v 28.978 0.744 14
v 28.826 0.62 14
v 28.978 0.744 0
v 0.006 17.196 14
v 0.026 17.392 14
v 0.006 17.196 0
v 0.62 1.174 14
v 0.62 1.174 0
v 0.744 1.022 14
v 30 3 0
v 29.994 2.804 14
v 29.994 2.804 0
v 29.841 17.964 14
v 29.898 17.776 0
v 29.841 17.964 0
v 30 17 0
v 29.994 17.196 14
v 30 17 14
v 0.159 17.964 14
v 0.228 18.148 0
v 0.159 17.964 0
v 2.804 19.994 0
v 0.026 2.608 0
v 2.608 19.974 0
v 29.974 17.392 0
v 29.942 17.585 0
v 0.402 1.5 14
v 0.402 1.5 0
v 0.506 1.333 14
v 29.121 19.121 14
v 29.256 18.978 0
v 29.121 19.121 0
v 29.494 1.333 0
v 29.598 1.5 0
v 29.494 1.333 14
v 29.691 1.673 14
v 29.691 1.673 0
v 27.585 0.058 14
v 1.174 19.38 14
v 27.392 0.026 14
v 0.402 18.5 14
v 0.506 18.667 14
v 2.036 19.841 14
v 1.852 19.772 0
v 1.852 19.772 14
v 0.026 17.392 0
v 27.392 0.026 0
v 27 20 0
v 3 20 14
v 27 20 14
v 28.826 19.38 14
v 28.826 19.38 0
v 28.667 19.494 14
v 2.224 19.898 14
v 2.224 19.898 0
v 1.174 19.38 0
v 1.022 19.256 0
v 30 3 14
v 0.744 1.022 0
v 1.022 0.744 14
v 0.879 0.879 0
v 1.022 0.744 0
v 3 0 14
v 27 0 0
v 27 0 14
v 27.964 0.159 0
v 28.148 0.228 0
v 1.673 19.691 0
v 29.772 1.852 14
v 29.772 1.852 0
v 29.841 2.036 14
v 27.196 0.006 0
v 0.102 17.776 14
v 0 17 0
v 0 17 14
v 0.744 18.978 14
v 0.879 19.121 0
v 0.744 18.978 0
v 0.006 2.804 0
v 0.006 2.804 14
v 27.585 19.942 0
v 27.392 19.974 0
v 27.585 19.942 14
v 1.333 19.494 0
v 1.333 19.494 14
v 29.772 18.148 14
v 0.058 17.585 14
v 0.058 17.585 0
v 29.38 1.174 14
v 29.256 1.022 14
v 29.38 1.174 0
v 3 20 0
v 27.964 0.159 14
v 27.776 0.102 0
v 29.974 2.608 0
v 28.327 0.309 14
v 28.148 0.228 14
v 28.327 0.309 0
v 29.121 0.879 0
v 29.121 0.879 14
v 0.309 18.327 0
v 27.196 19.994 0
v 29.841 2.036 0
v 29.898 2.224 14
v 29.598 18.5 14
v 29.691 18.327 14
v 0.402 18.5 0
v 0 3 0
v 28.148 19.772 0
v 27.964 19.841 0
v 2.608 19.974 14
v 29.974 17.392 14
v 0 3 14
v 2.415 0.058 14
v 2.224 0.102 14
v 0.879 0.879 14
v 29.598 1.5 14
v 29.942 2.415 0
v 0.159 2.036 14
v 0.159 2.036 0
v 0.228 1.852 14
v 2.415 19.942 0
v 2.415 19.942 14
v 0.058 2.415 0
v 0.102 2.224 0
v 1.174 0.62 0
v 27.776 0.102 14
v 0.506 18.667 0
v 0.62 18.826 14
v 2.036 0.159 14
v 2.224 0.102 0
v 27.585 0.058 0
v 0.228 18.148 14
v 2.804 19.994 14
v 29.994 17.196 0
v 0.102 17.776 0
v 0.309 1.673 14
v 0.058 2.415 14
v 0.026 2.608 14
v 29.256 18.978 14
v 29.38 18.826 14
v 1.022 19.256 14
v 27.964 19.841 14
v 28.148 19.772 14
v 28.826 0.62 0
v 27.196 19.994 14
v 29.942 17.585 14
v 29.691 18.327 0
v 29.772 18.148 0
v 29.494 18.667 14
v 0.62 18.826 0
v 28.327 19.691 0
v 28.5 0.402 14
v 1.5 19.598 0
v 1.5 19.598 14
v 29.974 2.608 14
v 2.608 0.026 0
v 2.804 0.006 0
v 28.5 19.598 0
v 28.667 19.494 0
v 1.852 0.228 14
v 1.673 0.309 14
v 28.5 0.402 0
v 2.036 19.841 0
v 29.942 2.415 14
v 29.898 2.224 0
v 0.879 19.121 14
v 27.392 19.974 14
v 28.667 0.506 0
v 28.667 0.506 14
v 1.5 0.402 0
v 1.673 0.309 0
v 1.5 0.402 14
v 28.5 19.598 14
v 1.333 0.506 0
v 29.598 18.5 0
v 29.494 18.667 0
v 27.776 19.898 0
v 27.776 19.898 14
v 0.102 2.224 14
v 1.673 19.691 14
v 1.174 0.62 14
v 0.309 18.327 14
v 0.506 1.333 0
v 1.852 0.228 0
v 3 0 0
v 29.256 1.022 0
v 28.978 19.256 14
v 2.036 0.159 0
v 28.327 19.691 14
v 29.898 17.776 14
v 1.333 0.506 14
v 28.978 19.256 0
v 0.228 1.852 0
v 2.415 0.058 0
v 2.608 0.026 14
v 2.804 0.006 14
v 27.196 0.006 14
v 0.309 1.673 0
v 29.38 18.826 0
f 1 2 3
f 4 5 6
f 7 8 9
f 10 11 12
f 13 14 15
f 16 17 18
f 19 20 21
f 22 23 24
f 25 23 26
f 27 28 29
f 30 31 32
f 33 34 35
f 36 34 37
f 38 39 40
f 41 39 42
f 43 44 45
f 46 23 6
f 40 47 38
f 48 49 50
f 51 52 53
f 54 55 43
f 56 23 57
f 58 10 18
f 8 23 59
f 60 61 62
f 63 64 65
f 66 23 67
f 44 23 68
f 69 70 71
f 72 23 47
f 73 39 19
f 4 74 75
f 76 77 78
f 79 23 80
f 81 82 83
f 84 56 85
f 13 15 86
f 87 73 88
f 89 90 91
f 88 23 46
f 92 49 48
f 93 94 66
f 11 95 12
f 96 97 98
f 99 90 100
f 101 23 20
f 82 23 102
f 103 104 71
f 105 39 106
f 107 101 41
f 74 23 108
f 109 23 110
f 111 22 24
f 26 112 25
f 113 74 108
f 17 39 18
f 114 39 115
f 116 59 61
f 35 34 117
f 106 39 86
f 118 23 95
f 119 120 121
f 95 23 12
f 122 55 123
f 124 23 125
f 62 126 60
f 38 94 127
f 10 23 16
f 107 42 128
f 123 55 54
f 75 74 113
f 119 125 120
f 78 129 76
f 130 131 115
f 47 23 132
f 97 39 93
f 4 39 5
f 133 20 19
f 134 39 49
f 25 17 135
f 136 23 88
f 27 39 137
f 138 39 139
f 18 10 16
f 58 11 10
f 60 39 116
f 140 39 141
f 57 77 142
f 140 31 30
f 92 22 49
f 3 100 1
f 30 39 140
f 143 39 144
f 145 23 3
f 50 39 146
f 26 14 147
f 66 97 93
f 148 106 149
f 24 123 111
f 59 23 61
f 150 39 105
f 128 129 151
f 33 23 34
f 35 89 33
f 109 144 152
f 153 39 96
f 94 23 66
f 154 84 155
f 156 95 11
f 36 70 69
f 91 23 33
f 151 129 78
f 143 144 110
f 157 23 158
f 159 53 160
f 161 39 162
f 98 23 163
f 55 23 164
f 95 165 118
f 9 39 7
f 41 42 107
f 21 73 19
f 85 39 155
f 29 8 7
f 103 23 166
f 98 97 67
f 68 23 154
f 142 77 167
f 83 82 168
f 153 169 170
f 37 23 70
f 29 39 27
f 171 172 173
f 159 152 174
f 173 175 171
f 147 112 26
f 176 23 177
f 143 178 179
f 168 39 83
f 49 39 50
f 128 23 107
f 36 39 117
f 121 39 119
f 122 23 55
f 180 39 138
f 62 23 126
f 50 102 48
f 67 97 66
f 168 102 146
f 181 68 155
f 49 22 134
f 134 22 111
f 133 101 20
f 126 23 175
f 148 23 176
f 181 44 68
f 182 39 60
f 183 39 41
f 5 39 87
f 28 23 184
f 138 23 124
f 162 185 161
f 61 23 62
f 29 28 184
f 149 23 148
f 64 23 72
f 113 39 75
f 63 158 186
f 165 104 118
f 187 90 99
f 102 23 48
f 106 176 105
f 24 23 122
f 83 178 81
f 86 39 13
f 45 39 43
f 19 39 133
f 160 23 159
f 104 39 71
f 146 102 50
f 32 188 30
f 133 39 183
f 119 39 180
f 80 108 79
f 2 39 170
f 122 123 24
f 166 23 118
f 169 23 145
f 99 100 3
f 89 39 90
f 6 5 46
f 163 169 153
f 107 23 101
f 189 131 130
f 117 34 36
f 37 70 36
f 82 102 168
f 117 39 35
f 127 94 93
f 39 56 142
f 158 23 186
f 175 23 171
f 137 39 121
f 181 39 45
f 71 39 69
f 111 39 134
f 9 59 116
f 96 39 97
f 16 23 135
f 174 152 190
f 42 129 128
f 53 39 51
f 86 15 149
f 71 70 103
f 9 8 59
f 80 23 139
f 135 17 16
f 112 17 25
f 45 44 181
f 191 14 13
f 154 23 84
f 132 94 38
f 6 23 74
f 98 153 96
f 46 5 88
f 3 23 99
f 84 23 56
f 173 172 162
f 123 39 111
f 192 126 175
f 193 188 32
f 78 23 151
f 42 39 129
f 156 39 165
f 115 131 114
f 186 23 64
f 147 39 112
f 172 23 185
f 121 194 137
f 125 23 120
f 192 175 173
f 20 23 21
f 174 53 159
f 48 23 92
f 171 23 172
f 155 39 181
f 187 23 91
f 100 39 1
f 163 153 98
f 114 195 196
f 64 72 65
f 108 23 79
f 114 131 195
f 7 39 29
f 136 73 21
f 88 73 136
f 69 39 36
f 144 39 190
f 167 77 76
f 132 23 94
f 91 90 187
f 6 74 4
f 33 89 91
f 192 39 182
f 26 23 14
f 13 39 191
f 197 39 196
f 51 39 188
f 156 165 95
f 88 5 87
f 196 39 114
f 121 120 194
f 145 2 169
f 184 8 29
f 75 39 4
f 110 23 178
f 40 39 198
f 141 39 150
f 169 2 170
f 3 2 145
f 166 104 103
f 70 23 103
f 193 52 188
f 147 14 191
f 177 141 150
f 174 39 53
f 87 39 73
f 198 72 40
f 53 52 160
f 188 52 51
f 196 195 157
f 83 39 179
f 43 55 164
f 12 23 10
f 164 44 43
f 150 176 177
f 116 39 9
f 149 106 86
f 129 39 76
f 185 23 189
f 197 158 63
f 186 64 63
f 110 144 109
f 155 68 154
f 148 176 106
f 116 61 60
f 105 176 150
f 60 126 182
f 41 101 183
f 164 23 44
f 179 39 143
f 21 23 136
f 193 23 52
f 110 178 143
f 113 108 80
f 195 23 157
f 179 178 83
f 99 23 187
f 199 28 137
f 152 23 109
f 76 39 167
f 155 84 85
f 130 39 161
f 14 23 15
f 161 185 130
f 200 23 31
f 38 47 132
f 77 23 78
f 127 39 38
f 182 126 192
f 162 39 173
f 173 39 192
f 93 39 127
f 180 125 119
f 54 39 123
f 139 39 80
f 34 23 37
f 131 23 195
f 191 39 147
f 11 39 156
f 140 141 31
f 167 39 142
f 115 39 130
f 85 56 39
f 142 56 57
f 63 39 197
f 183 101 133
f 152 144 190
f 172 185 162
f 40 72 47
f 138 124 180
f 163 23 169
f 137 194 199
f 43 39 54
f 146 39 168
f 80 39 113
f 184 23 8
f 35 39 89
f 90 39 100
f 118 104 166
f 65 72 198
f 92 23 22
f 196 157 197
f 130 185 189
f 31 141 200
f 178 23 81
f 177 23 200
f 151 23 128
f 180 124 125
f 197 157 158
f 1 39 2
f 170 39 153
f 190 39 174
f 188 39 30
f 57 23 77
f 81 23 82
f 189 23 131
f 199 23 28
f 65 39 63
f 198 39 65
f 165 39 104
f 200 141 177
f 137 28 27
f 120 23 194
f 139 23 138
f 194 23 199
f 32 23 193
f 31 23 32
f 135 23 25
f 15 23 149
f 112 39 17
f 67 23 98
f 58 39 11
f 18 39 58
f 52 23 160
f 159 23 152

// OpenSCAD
// hull of two rounded plates built the corpus's way — crossed slabs plus four corner cylinders,
// UNIONED (things 4813293, 813330, 1828460 …): each rim survives only as a quarter arc, the rest
// runs through the slabs. The whole circles lie in the child, so they are the hull's features.
$fn = 96;
module plate() {
  union() {
    translate([0, 3, 0]) cube([30, 14, 4]);
    translate([3, 0, 0]) cube([24, 20, 4]);
    for (x = [3, 27], y = [3, 17]) translate([x, y, 0]) cylinder(r = 3, h = 4);
  }
}
hull() {
  plate();
  translate([0, 0, 10]) plate();
}
